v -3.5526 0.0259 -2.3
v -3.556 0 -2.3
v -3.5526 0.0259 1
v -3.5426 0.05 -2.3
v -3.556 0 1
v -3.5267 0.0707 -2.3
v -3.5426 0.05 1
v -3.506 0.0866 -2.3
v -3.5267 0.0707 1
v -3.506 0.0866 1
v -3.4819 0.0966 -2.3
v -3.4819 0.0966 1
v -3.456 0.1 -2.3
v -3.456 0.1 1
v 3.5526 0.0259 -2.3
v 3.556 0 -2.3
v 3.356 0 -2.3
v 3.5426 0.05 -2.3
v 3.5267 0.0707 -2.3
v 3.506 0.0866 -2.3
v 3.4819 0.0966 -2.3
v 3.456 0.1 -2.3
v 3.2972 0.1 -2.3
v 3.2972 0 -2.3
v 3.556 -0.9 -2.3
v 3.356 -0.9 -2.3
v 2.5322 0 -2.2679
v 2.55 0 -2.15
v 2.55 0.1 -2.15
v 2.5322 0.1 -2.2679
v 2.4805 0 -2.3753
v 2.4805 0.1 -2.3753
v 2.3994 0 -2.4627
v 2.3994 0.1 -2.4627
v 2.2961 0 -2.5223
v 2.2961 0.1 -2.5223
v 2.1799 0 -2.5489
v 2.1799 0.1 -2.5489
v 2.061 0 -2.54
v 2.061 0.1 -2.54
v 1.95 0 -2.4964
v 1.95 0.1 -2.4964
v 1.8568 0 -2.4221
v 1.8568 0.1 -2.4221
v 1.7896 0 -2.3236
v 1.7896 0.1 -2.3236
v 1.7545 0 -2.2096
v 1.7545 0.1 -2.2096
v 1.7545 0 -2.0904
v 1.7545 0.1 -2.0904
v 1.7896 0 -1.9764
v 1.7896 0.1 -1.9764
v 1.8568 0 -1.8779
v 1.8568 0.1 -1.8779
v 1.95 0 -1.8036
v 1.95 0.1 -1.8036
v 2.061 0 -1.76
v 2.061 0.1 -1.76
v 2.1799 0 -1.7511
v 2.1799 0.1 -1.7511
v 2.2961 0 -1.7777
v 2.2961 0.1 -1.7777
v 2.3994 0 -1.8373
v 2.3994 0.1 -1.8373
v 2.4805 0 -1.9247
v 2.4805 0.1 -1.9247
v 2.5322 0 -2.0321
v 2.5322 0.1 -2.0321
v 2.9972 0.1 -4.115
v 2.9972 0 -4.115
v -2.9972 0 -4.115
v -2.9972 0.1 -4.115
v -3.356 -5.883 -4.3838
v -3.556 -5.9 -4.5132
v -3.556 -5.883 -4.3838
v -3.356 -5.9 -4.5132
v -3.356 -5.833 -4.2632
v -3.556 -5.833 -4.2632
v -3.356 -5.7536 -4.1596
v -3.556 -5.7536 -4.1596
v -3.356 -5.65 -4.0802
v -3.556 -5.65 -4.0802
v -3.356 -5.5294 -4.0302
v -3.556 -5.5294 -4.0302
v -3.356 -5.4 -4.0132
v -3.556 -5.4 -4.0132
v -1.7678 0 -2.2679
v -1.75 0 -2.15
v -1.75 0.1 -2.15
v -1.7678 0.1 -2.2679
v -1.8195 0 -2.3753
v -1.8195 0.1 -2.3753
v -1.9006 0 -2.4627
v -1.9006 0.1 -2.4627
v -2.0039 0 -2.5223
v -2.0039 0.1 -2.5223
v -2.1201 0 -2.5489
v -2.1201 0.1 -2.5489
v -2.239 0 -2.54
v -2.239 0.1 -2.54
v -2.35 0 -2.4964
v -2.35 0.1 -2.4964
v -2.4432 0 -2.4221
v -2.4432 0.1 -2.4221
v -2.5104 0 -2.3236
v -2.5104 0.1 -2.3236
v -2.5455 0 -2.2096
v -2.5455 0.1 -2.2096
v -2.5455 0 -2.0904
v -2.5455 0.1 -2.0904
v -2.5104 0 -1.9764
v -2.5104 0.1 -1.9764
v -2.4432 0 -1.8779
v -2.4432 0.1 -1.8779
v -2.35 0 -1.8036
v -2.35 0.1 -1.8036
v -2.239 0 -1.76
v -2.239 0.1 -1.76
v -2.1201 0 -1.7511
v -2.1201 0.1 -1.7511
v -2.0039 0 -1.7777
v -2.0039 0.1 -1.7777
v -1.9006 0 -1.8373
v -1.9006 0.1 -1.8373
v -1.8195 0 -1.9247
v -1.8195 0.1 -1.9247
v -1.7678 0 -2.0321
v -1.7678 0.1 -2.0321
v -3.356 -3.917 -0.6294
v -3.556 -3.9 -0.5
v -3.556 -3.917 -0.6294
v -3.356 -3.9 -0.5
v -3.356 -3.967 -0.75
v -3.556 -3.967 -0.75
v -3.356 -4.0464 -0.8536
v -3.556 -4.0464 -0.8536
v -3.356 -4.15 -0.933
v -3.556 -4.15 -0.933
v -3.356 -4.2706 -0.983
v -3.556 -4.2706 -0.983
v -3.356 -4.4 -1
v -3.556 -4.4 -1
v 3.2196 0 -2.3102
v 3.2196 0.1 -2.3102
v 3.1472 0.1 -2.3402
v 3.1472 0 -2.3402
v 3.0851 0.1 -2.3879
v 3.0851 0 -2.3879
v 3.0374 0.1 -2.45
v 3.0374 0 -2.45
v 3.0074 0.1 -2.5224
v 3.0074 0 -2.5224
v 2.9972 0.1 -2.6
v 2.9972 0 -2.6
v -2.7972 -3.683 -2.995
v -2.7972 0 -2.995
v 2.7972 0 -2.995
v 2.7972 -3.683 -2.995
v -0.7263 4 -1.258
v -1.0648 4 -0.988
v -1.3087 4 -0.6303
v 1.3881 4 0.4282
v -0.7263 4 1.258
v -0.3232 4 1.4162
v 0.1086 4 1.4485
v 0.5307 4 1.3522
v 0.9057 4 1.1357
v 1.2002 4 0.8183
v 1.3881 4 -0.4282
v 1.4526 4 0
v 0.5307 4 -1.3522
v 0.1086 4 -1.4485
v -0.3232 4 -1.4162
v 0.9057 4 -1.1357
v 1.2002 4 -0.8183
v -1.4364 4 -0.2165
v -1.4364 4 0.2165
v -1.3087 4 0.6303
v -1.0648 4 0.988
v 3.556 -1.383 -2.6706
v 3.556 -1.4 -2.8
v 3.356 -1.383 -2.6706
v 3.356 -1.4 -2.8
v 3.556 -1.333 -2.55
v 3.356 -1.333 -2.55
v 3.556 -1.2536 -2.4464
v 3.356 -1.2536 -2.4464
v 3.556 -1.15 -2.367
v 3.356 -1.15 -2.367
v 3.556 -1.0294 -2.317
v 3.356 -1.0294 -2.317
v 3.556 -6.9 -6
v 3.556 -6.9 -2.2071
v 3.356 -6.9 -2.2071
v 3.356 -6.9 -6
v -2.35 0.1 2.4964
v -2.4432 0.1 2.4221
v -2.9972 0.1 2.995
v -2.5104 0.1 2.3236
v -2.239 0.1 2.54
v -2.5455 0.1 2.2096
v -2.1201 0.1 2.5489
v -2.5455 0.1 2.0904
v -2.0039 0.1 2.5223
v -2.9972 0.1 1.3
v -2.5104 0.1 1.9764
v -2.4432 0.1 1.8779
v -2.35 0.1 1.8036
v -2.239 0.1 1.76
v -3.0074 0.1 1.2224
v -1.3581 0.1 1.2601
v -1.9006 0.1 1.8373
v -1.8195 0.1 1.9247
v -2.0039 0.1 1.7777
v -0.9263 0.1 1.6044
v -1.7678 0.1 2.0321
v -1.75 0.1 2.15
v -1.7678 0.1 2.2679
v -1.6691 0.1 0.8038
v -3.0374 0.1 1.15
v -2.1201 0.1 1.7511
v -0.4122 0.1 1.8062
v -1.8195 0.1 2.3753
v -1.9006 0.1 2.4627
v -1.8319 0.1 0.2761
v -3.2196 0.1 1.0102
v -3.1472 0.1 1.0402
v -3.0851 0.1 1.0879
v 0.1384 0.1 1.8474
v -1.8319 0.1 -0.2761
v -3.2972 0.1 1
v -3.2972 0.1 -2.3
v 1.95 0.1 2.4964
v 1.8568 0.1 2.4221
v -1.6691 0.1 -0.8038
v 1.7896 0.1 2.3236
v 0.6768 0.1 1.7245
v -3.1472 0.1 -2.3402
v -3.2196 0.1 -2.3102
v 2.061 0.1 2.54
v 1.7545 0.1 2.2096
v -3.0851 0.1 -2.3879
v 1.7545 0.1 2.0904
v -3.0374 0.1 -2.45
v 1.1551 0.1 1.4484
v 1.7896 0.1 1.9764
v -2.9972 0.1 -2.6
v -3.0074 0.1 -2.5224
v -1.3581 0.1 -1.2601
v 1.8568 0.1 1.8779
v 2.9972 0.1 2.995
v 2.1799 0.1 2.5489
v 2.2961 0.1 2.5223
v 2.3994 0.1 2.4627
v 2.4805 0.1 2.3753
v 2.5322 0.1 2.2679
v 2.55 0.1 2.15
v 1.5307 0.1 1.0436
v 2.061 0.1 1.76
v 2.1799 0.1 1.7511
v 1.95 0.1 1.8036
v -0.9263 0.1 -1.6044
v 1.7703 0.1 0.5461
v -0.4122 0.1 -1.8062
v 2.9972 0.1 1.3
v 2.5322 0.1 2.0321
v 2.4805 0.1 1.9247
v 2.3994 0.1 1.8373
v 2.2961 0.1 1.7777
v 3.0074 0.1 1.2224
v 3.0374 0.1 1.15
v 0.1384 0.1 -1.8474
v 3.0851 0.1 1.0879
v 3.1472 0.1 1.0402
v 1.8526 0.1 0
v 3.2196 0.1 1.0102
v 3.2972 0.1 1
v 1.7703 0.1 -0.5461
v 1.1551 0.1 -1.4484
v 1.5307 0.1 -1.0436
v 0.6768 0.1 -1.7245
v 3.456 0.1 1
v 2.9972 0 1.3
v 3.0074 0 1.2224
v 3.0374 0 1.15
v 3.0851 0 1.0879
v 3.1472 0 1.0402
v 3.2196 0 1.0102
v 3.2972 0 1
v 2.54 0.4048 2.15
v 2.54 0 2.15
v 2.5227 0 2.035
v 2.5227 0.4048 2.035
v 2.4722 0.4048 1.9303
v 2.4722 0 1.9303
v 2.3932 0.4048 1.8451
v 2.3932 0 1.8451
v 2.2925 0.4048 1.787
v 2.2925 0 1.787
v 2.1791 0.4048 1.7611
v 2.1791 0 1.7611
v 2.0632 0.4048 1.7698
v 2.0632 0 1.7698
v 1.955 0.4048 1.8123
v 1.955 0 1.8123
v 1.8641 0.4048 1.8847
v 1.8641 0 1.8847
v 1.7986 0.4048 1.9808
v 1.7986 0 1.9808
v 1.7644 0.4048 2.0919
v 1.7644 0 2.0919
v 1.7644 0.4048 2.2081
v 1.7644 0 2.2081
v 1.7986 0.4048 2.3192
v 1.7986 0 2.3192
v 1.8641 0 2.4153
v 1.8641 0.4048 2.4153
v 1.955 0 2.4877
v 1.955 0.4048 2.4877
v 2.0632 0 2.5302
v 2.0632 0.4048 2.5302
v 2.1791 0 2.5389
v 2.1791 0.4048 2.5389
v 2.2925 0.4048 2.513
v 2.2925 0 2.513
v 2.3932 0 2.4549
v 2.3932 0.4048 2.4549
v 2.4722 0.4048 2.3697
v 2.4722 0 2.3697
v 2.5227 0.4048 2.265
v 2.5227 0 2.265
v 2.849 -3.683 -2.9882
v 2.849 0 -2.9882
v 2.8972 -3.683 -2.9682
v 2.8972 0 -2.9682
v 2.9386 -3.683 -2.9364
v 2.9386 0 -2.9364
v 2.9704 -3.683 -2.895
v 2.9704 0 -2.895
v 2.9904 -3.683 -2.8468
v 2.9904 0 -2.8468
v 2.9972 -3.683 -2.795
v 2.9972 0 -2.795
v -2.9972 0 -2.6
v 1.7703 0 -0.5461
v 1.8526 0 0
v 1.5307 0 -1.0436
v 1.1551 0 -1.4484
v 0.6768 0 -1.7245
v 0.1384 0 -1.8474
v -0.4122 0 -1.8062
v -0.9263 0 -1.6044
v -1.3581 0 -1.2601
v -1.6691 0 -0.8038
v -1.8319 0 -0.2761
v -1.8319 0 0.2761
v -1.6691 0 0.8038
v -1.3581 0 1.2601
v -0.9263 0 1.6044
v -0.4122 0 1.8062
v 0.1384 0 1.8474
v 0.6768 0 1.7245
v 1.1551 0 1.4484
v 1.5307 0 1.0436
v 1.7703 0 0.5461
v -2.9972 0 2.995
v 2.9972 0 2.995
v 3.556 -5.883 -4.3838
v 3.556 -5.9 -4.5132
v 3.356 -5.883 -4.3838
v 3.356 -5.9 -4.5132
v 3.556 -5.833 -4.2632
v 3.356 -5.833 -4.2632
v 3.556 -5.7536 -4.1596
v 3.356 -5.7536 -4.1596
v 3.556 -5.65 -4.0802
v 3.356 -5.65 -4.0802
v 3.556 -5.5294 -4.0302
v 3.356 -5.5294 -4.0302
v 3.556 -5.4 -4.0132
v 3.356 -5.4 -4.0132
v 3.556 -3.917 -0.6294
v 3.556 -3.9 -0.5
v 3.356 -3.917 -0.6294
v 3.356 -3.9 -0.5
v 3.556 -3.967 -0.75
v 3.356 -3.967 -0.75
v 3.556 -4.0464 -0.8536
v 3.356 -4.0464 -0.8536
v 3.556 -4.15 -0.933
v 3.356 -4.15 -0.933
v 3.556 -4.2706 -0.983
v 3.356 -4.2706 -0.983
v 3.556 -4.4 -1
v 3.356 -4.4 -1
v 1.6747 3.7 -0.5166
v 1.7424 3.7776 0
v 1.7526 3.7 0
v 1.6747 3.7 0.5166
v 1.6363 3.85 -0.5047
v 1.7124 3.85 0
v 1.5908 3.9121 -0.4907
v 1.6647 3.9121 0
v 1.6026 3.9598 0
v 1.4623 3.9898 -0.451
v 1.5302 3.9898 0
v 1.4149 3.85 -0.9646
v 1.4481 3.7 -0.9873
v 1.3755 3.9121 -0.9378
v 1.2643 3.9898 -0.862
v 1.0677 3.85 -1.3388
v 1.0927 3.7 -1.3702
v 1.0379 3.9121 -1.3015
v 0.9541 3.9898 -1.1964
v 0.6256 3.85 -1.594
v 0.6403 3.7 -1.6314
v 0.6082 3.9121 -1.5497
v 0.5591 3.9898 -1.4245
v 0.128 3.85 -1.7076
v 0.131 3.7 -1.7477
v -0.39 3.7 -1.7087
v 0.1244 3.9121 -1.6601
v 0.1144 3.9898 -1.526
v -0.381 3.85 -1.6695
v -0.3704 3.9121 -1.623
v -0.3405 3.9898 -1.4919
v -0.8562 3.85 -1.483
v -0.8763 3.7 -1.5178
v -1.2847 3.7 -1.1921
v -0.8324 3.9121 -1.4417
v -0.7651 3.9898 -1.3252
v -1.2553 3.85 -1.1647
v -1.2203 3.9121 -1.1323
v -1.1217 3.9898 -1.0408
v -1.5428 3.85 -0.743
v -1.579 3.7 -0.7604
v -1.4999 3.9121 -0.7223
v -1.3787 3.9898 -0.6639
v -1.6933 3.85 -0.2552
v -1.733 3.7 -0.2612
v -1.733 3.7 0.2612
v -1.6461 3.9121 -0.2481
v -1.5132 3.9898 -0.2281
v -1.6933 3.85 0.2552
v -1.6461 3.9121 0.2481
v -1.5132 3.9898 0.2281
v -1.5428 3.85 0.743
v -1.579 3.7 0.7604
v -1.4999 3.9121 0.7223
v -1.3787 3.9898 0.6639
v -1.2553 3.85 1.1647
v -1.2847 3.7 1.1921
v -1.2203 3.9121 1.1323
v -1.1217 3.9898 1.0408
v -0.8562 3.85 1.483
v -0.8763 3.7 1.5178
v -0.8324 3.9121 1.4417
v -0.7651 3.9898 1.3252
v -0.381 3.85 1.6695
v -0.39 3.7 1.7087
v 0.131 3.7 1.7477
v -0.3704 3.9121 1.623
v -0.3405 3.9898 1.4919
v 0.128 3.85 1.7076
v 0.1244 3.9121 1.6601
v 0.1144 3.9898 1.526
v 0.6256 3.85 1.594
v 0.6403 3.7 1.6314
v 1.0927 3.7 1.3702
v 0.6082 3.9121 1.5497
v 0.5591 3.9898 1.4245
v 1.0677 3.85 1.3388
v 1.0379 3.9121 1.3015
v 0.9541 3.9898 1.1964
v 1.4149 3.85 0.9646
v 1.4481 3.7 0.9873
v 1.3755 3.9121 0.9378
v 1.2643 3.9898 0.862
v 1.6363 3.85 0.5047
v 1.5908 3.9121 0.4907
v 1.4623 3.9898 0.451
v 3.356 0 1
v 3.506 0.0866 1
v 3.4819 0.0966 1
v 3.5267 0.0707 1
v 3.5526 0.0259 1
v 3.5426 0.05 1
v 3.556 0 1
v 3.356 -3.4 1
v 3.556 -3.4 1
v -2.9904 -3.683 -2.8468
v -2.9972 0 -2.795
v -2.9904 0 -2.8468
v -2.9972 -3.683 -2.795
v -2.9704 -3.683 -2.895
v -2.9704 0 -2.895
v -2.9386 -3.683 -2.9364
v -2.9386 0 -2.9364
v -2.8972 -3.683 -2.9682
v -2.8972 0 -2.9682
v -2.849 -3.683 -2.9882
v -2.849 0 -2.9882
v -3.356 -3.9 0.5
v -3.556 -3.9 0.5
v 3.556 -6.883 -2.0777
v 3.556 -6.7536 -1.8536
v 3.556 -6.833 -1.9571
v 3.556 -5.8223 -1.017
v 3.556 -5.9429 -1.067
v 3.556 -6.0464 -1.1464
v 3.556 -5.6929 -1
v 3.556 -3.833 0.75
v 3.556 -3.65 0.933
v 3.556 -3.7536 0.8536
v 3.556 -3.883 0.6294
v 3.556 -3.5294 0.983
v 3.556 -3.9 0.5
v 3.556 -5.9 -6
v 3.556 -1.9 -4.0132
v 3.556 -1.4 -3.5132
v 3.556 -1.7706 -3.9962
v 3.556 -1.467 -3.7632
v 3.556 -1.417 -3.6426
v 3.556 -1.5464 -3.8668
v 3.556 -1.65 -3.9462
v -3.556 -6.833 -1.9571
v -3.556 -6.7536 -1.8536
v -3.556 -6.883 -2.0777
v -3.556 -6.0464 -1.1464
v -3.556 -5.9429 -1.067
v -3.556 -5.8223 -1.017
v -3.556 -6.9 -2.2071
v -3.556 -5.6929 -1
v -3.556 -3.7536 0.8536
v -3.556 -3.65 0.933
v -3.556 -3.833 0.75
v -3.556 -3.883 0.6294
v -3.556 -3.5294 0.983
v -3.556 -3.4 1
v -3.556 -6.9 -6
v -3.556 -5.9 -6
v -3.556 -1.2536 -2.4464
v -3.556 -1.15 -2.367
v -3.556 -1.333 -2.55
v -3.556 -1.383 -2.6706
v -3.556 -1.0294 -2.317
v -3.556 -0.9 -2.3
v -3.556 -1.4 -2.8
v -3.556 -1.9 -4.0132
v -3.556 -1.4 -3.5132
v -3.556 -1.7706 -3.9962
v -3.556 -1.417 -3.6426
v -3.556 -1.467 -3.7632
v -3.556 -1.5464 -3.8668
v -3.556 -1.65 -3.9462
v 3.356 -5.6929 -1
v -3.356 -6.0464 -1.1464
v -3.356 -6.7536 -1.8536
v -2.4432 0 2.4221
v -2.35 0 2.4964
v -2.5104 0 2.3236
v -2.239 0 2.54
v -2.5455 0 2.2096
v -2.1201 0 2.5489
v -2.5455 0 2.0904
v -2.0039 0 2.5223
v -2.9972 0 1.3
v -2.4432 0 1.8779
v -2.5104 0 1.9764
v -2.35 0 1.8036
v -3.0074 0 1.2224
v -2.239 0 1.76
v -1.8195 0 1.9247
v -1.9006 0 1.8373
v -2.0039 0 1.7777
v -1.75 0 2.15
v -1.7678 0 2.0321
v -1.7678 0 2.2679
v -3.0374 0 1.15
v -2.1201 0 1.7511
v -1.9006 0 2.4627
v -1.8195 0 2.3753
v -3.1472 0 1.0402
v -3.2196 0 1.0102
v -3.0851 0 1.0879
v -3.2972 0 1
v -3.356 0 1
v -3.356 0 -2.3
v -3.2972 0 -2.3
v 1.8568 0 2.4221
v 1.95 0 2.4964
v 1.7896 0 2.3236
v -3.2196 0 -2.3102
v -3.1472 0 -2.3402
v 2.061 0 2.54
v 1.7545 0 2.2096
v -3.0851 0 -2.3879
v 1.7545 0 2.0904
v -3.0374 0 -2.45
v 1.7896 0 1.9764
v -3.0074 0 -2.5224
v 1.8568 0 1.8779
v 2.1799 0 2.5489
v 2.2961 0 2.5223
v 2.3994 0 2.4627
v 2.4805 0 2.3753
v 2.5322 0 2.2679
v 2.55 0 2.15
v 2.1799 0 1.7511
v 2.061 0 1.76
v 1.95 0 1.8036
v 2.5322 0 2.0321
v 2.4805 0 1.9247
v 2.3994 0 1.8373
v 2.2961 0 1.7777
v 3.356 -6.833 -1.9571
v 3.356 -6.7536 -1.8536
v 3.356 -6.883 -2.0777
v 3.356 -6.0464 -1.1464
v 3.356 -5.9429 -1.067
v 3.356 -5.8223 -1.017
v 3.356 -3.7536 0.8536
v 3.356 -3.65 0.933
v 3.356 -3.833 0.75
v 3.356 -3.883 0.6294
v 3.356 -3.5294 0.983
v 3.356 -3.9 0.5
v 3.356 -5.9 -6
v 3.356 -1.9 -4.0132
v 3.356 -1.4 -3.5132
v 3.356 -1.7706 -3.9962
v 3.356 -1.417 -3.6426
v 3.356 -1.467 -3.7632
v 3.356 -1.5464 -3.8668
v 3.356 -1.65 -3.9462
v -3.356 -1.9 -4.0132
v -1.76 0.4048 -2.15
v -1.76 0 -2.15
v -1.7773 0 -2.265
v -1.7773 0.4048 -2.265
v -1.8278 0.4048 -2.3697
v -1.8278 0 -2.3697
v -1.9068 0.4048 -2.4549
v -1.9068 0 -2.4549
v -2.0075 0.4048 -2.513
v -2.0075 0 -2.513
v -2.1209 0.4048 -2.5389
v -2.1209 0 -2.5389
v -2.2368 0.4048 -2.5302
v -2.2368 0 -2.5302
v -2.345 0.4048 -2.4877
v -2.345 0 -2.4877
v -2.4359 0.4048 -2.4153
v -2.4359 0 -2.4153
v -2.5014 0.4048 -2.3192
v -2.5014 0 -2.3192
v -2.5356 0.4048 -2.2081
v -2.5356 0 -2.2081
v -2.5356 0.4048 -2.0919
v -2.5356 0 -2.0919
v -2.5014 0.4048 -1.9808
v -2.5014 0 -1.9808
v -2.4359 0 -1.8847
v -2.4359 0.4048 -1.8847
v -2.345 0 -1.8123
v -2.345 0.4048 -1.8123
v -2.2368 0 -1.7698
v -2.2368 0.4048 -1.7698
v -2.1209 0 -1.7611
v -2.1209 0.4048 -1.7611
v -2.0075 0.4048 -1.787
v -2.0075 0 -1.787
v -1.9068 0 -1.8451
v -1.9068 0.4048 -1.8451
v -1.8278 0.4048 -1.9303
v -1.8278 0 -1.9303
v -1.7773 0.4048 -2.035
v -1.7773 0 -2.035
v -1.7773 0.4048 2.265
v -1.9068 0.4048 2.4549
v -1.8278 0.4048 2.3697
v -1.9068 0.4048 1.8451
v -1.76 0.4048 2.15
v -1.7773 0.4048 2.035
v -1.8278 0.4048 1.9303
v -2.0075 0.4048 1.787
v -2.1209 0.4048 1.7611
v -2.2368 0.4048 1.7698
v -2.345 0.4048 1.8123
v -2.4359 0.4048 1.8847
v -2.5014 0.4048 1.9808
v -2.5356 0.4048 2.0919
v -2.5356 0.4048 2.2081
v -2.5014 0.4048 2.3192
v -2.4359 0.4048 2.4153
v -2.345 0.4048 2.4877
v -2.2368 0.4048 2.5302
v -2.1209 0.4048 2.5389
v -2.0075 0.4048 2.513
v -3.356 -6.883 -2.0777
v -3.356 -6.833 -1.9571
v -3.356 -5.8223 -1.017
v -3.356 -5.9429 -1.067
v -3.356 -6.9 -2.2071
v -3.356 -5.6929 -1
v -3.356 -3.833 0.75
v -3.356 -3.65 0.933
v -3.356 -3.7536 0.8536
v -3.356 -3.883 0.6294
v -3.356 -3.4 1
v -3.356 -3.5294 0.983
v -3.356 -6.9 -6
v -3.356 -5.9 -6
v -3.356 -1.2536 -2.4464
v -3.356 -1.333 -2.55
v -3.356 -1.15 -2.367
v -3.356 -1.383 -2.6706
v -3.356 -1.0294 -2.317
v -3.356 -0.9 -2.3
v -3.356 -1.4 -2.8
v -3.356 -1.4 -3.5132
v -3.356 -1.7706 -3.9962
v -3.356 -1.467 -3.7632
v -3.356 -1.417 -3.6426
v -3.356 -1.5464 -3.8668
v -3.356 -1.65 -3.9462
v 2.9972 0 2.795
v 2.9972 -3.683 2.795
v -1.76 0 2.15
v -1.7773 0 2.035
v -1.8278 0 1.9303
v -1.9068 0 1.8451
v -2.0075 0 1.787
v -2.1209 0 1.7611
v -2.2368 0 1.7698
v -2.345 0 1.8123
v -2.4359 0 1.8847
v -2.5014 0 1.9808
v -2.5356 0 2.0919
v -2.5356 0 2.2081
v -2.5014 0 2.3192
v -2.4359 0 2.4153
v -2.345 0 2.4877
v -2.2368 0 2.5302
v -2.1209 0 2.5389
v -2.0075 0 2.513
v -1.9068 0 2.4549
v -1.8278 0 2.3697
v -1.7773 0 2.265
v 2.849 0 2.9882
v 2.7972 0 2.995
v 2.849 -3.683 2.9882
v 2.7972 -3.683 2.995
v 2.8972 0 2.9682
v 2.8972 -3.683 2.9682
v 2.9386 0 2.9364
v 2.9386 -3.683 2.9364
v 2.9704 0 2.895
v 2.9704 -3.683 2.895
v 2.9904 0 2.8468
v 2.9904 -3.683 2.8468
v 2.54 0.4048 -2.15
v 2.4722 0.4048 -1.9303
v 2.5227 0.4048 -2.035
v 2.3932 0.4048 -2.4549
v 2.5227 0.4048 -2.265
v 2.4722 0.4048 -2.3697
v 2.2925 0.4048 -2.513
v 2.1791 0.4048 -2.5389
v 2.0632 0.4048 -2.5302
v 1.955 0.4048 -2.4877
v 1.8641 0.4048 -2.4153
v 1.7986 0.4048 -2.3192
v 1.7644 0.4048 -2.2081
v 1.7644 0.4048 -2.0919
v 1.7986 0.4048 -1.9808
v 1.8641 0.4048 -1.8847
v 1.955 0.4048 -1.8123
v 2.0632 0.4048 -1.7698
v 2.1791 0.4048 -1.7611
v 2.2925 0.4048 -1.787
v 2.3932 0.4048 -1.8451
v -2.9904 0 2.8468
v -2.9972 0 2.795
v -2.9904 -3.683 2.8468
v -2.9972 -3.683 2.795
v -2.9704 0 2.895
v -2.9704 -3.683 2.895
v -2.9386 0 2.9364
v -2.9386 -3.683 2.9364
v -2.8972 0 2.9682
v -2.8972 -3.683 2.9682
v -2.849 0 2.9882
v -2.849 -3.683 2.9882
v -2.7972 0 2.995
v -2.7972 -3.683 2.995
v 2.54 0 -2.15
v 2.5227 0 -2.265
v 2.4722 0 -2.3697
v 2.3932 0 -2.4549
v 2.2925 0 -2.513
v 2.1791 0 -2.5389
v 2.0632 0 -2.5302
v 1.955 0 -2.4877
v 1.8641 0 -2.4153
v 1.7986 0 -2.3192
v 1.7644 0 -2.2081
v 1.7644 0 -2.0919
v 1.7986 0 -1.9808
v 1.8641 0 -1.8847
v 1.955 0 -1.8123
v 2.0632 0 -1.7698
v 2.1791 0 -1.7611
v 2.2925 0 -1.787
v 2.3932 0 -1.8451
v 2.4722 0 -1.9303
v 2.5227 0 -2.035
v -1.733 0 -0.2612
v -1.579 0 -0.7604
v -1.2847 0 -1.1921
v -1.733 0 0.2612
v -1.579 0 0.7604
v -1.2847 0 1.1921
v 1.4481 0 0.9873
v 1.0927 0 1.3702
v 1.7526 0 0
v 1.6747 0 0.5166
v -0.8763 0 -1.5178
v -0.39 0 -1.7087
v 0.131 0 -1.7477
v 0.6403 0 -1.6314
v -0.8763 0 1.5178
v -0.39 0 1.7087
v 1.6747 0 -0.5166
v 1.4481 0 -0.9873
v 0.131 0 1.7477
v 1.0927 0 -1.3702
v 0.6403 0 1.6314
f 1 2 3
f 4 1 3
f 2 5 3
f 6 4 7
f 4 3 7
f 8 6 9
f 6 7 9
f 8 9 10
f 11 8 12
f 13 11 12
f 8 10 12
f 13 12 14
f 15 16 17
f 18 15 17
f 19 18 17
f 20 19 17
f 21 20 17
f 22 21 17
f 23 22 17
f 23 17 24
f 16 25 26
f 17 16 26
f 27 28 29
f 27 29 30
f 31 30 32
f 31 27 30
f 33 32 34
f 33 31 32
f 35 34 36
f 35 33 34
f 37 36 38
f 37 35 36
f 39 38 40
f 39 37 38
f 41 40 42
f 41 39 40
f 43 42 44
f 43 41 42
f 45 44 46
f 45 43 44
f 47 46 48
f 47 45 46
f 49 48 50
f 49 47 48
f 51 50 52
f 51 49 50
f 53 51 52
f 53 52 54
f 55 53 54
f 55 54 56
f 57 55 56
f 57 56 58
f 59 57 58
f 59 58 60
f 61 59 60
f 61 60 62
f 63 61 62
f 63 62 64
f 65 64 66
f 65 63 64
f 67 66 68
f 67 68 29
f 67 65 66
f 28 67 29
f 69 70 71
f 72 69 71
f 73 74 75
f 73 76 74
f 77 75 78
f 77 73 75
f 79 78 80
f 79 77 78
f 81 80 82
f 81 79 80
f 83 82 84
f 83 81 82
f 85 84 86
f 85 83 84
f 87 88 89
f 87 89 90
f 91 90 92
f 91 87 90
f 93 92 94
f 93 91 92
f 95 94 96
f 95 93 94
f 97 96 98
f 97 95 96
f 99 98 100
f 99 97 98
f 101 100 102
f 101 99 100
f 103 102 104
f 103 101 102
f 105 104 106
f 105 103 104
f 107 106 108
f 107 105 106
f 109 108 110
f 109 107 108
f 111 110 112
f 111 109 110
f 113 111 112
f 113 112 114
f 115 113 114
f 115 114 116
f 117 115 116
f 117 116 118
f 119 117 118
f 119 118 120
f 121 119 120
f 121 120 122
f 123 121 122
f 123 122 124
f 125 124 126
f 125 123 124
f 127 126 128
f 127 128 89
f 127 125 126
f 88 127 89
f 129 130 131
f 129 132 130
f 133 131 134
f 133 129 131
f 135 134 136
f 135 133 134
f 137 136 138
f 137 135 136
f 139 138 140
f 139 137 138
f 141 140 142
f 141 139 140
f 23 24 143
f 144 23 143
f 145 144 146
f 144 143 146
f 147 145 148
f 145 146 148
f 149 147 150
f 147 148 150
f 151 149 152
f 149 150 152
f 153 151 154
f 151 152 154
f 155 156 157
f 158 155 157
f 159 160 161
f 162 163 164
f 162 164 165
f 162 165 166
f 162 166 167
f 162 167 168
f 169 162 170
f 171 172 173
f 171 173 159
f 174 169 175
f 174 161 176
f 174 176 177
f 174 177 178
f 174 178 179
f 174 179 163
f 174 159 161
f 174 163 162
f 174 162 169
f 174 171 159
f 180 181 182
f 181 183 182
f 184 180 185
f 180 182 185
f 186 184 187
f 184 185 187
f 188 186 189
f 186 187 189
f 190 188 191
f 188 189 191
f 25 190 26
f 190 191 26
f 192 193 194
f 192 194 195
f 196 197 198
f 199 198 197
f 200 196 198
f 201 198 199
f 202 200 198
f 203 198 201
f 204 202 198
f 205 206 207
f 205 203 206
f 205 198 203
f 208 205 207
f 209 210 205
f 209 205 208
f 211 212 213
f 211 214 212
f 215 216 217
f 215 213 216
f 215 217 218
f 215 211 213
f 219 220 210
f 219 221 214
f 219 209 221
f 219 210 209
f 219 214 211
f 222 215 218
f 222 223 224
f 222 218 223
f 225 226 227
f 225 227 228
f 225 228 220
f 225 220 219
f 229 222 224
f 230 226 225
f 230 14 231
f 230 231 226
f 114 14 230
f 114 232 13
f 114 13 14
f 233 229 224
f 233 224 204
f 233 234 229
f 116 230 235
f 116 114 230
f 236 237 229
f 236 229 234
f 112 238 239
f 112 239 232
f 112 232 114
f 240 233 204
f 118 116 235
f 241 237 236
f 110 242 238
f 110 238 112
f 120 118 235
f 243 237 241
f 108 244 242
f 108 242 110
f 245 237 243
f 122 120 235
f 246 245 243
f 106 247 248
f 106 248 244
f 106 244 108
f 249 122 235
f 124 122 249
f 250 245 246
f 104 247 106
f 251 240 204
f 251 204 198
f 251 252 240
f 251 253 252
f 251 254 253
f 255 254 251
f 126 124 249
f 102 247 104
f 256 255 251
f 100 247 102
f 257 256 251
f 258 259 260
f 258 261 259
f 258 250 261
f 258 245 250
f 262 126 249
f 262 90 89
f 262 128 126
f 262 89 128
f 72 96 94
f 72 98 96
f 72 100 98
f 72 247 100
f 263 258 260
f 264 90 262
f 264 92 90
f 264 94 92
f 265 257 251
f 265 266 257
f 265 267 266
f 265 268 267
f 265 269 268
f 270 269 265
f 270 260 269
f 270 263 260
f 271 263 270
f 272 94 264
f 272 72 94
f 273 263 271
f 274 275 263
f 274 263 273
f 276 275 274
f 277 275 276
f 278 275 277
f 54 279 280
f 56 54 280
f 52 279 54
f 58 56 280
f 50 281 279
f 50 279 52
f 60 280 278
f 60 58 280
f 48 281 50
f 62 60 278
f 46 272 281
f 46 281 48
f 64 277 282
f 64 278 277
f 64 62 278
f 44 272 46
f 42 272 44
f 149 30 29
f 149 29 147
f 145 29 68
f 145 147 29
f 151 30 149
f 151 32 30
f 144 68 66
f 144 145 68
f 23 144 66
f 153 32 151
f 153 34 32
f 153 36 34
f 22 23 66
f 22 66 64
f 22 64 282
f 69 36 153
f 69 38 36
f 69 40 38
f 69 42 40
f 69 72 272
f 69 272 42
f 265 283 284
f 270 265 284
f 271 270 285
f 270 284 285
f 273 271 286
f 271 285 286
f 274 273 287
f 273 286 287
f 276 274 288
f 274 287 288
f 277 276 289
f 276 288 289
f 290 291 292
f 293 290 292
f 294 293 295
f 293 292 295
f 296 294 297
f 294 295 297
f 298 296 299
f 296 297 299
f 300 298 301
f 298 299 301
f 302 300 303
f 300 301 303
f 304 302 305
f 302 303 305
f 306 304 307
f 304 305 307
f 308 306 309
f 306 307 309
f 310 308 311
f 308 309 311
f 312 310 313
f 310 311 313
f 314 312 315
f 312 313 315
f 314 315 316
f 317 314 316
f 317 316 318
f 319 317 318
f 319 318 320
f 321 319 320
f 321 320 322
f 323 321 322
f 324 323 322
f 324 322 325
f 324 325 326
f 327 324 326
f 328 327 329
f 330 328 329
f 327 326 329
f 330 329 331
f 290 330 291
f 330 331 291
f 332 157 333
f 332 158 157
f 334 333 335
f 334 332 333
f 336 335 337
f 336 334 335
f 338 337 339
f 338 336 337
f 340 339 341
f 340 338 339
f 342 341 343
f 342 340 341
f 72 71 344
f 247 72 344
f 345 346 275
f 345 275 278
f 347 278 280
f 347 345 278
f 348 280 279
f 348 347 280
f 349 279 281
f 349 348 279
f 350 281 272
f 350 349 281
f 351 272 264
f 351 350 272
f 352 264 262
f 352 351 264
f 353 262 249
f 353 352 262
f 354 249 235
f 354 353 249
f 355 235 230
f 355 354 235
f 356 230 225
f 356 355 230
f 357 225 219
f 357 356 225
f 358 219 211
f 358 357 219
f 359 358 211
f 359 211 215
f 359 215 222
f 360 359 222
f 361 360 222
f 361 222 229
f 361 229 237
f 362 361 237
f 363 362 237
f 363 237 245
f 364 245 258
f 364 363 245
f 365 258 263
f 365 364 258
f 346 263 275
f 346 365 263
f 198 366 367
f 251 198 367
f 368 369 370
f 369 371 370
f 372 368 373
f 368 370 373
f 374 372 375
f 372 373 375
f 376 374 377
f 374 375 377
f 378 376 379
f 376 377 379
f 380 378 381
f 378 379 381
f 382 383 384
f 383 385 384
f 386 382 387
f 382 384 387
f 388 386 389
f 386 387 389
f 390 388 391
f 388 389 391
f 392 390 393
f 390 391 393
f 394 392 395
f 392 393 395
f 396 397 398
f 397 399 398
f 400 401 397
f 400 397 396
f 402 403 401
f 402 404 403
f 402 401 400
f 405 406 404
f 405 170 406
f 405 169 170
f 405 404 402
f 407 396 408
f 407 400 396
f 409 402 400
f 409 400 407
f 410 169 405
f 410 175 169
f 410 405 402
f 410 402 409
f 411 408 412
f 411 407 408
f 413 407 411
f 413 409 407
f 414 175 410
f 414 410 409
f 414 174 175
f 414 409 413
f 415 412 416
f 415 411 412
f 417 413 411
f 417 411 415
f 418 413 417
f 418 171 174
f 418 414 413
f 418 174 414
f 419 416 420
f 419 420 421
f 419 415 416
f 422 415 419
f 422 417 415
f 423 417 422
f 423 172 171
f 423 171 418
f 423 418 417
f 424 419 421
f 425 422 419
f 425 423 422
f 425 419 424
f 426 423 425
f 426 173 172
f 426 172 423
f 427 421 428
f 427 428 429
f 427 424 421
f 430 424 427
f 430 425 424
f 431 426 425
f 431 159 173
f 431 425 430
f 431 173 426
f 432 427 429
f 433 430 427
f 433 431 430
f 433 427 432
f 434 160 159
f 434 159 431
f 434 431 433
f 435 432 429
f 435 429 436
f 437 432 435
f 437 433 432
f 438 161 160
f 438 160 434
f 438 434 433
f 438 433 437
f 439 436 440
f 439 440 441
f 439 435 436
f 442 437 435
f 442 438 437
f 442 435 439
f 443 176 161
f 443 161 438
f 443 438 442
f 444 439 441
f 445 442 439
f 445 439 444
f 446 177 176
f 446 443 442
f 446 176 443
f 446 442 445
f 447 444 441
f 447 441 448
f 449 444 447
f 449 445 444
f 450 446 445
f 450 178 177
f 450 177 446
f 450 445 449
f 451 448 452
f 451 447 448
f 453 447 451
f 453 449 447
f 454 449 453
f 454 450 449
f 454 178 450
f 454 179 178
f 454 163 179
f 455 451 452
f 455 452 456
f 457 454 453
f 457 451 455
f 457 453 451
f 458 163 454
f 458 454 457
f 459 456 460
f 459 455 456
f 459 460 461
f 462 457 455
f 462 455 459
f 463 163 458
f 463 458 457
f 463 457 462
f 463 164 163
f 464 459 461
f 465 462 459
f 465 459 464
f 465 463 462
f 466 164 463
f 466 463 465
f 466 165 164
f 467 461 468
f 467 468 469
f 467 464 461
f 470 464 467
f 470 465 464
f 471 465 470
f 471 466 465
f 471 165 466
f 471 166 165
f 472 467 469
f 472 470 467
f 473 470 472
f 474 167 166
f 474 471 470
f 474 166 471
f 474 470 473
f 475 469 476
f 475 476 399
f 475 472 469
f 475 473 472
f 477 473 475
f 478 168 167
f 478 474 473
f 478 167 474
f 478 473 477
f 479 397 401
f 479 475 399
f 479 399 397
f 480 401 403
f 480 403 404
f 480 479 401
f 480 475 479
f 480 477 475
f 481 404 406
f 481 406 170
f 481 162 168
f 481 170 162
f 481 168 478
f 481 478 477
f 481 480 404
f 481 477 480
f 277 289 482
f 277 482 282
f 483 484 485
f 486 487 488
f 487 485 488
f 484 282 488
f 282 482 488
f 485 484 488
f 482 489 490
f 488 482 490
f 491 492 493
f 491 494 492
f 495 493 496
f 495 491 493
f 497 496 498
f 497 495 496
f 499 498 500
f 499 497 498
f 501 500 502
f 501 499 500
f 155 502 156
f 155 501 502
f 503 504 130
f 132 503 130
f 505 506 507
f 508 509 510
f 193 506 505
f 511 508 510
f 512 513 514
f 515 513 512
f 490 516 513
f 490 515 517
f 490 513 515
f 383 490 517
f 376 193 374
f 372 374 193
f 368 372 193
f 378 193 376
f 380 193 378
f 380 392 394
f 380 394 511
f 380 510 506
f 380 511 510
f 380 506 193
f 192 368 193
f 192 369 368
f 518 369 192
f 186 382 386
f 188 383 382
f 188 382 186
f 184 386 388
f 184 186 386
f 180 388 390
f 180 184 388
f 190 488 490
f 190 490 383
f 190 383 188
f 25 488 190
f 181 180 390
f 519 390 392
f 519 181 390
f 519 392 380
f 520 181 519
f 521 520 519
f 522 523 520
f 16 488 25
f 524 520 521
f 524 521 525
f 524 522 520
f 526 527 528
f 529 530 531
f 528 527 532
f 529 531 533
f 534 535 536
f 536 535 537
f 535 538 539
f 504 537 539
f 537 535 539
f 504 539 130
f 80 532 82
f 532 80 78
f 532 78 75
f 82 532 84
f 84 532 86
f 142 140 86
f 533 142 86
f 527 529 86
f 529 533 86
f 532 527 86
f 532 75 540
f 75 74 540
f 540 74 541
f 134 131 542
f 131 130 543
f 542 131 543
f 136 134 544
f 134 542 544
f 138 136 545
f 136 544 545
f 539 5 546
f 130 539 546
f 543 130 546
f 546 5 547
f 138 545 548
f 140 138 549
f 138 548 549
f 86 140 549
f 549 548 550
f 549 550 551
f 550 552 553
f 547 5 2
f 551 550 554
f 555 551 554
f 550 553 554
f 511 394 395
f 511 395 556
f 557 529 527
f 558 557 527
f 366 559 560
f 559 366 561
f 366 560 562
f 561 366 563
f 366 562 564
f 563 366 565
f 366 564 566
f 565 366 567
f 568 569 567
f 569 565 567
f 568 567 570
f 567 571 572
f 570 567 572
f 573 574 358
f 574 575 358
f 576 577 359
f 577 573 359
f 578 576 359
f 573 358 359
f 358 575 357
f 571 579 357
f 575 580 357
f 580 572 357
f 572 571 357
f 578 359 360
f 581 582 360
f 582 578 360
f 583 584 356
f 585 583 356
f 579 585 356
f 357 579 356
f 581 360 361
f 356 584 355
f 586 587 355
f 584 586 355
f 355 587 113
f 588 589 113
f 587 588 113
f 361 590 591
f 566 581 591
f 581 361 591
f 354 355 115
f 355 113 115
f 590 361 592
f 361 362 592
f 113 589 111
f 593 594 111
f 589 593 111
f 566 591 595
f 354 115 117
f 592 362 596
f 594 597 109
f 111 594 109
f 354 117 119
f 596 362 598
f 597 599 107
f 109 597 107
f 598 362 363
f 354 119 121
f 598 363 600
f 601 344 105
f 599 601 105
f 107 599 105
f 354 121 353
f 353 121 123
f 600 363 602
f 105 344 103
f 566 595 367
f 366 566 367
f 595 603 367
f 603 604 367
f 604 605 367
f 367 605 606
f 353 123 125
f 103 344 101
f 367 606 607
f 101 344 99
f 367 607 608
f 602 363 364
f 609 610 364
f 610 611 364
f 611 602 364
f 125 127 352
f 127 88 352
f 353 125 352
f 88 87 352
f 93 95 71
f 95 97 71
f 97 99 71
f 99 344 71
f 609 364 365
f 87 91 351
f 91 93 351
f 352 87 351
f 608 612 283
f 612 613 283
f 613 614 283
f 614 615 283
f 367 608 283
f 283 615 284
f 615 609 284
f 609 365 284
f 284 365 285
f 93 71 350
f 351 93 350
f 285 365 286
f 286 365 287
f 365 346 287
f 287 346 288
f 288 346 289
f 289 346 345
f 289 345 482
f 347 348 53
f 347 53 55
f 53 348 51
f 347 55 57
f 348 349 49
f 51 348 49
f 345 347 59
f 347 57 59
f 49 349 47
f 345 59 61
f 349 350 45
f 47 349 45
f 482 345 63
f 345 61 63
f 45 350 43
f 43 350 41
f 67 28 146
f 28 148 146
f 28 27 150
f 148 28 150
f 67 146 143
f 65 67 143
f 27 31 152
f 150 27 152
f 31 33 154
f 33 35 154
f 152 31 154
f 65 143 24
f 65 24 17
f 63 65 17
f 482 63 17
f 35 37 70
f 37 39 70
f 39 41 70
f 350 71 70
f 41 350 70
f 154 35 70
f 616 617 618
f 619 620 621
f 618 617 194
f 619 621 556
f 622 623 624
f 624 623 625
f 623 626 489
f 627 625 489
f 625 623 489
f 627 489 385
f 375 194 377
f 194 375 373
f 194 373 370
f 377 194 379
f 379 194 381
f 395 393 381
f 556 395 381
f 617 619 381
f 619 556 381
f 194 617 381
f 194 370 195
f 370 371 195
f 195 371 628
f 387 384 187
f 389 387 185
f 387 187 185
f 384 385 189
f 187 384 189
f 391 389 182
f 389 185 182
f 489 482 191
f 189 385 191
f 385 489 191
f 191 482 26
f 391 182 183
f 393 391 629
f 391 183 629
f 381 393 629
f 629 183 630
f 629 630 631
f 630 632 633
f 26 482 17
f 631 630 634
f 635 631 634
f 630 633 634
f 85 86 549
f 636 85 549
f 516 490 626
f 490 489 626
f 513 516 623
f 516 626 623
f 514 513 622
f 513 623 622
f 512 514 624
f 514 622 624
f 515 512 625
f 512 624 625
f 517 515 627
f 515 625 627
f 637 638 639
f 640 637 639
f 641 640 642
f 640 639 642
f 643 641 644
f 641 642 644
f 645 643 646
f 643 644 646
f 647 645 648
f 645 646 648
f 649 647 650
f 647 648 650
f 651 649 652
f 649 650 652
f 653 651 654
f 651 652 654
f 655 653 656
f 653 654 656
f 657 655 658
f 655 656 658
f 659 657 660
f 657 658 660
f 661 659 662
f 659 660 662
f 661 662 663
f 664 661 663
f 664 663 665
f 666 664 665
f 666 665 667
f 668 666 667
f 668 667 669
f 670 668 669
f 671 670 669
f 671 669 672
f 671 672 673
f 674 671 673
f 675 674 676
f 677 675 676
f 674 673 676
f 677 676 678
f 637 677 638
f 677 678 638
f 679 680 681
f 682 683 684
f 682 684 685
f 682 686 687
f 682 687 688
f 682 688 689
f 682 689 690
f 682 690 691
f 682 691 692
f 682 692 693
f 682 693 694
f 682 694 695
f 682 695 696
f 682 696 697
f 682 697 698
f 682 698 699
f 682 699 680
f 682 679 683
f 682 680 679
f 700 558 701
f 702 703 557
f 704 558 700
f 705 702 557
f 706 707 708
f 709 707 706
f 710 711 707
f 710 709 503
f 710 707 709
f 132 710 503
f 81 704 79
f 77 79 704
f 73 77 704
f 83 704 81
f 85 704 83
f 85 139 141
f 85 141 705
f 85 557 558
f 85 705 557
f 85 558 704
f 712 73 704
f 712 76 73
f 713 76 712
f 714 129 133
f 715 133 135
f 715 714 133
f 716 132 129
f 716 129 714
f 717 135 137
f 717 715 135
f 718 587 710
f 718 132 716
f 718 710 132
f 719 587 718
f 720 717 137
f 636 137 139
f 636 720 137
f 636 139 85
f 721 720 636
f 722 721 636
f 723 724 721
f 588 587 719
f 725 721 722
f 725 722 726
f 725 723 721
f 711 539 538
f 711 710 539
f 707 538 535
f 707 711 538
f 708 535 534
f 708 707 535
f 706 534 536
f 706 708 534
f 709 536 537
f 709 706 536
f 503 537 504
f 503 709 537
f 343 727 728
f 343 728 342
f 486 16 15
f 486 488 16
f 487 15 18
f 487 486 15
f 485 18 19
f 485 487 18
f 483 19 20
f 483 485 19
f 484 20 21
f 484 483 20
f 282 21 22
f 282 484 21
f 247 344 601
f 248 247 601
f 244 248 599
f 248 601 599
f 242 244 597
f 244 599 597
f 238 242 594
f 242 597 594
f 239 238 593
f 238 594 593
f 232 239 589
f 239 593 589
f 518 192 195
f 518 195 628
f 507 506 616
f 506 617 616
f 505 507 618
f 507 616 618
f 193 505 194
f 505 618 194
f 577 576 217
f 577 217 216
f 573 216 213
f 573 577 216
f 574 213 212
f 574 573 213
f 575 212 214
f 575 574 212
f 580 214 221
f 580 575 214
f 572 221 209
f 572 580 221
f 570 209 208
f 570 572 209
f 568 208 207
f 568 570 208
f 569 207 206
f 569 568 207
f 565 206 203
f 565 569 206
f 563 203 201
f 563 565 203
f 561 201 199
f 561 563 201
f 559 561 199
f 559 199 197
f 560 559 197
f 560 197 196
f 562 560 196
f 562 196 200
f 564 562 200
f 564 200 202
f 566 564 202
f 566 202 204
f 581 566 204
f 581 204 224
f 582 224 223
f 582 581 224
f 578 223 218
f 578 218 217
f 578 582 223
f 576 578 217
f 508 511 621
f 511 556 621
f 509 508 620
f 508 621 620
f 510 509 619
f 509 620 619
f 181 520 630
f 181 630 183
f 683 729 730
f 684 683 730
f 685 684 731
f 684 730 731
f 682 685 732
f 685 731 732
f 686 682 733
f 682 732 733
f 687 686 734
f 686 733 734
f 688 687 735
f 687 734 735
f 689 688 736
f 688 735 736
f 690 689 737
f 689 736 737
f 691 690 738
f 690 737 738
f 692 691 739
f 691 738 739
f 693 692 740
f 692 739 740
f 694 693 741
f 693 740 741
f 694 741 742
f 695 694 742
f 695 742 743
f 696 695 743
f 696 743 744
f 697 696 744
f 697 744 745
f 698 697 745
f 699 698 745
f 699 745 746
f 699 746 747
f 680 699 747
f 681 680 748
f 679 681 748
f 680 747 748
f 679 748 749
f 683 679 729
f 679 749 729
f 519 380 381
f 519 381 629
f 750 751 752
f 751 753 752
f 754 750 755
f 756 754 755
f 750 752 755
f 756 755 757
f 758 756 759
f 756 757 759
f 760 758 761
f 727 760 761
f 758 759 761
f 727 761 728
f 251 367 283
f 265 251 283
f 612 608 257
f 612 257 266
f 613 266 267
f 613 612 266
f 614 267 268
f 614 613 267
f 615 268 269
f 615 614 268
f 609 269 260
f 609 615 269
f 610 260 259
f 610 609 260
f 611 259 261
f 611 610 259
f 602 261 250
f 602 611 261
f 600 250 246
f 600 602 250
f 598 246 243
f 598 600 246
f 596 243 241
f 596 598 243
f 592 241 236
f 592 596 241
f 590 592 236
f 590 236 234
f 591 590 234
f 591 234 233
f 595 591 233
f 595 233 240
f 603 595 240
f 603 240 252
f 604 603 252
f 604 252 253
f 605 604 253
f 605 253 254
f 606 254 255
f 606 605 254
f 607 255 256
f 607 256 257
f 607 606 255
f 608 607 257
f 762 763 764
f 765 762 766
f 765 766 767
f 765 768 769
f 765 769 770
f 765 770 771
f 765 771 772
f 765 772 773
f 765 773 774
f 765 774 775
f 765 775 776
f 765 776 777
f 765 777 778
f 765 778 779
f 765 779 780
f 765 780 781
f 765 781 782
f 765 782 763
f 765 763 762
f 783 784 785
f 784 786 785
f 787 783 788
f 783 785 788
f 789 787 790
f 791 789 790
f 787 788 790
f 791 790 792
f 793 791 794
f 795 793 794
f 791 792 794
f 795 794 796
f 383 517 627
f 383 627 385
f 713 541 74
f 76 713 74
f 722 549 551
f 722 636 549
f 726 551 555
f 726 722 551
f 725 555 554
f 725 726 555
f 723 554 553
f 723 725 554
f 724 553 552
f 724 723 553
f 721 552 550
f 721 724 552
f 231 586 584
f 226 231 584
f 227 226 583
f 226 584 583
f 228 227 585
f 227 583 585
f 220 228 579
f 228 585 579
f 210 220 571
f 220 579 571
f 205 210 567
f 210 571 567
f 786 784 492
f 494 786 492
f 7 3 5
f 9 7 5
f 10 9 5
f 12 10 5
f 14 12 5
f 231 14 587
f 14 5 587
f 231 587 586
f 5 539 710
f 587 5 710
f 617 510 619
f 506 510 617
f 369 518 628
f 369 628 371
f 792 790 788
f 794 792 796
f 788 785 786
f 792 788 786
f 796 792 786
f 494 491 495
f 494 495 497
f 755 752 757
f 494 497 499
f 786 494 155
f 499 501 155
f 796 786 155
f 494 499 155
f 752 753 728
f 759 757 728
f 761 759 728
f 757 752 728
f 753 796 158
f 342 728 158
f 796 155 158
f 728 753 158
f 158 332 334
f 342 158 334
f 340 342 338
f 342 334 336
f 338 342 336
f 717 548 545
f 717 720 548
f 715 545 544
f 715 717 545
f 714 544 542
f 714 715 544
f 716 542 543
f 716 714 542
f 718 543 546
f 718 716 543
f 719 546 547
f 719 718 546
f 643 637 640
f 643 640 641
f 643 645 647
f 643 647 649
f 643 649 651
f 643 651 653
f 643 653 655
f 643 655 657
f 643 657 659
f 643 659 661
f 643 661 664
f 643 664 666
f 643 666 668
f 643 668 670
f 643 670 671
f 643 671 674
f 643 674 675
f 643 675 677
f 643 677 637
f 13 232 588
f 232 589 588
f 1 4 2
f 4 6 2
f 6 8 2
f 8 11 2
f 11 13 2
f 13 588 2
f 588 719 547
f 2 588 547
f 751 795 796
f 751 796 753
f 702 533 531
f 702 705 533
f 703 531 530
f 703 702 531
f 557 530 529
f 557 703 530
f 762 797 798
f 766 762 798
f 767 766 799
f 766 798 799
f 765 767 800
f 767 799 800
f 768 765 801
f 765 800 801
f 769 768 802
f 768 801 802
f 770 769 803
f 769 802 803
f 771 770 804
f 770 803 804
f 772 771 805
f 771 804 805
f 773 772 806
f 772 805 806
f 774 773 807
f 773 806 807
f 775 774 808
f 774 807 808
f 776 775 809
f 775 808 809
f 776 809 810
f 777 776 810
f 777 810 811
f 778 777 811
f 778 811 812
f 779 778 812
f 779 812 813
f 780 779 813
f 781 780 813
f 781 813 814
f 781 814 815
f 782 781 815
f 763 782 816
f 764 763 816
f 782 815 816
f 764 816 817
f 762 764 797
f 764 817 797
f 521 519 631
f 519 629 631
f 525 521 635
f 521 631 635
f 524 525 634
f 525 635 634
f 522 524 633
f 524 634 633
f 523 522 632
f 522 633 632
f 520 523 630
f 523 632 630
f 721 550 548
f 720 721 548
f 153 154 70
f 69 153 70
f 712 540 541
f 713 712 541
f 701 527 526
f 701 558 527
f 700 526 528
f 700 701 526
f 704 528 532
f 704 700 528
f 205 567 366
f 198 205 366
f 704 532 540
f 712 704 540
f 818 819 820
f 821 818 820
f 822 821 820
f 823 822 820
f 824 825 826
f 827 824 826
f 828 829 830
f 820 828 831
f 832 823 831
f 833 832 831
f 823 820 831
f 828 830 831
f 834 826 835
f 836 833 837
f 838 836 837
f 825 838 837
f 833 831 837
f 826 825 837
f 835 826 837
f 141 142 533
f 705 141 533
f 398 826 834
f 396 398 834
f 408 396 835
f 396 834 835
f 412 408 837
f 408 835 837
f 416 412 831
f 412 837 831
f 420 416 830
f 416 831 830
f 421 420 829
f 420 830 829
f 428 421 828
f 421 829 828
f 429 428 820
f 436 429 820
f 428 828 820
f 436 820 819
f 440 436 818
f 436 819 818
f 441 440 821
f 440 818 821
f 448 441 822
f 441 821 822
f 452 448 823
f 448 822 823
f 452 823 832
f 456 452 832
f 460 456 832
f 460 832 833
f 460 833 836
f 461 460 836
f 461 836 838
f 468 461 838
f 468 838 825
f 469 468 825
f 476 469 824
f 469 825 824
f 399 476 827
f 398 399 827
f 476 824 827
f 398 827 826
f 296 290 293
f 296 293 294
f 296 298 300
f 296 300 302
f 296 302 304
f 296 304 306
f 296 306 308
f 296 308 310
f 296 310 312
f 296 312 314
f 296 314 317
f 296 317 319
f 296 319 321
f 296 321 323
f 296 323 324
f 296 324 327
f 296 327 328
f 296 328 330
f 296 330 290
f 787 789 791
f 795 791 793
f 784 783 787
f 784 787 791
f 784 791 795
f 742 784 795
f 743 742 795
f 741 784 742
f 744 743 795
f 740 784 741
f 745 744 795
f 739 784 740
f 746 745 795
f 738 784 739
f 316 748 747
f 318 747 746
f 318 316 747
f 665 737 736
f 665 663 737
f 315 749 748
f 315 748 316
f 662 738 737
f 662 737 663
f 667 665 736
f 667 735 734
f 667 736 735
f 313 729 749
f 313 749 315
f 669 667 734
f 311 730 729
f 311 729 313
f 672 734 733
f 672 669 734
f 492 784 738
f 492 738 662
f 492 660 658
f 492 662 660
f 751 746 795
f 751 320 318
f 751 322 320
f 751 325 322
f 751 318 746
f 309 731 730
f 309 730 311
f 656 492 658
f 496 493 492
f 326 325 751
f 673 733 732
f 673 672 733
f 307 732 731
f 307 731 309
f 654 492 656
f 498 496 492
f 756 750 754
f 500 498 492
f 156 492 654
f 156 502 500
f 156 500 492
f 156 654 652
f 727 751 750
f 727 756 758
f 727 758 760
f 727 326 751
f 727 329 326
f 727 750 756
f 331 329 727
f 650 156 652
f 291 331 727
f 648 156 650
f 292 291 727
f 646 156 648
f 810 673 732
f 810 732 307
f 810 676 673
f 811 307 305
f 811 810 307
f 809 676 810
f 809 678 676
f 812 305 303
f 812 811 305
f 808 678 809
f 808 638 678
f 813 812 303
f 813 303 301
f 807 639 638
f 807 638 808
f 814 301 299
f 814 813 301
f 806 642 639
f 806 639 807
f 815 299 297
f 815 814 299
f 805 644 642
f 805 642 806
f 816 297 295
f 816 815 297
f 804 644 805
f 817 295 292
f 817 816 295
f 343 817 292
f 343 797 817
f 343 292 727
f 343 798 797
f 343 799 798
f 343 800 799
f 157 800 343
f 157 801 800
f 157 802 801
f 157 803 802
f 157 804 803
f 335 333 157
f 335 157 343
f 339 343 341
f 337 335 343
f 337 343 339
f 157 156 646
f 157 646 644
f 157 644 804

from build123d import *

# Parameters (mm, degrees)
SKETCH1_W           = 5.9944
SKETCH1_H           = 5.99
EXTRUDE1_DEPTH      = 3.683
EXTRUDE2_DEPTH      = 0.2
FILLET3_R           = 0.5
SKETCH6_R           = 1.8526
SKETCH6_R_2         = 0.4
EXTRUDE3_DEPTH      = 0.1
SKETCH2_R           = 1.7526
EXTRUDE4_DEPTH      = 4
FILLET1_R           = 0.1
SKETCH8_R           = 0.39
BOSS_EXTRUDE1_DEPTH = 0.4048
FILLET4_R           = 0.2
FILLET5_R           = 0.3


with BuildPart() as part:
    # Sketch1 → Extrude1 (new body)
    with BuildSketch(Plane(origin=(0, 0, 0), x_dir=(1, 0, 0), z_dir=(0, 1, 0))):
        Rectangle(SKETCH1_W, SKETCH1_H)
    extrude(amount=-EXTRUDE1_DEPTH)

    # Sketch8 → Boss-Extrude1 (add)
    with BuildSketch(Plane(origin=(0, 0, 0), x_dir=(1, 0, 0), z_dir=(0, 1, 0))):
        with Locations((2.15, 2.15)):
            Circle(SKETCH8_R)
        with Locations((2.15, -2.15)):
            Circle(SKETCH8_R)
        with Locations((-2.15, 2.15)):
            Circle(SKETCH8_R)
        with Locations((-2.15, -2.15)):
            Circle(SKETCH8_R)
    extrude(amount=BOSS_EXTRUDE1_DEPTH)

    # Fillet4
    fillet4_edges = [part.edges().sort_by_distance(p)[0] for p in [
        (-2.9972, -1.8415, -2.995),
        (2.9972, -1.8415, -2.995),
        (2.9972, -1.8415, 2.995),
        (-2.9972, -1.8415, 2.995),
    ]]
    fillet(fillet4_edges, radius=FILLET4_R)


with BuildPart() as body_2:
    # Sketch5 → Extrude2 (new body)
    with BuildSketch(Plane(origin=(3.556, 0, 0), x_dir=(0, 0, -1), z_dir=(1, 0, 0))):
        Polygon((2.3, 0.1), (-1, 0.1), (-1, -3.9), (1, -3.9), (1, -5.9), (2, -6.9), (6, -6.9), (6, -5.9), (4.0132, -5.9), (4.0132, -1.4), (2.3, -1.4), align=None)
    extrude(amount=-EXTRUDE2_DEPTH)

    # Fillet3
    fillet3_edges = [body_2.edges().sort_by_distance(p)[0] for p in [
        (3.456, -3.9, 1),
        (3.456, -1.4, -2.3),
        (3.456, -1.4, -4.0132),
        (3.456, -5.9, -4.0132),
        (3.456, -6.9, -2),
        (3.456, -5.9, -1),
        (3.456, -3.9, -1),
    ]]
    fillet(fillet3_edges, radius=FILLET3_R)


with BuildPart() as body_3:
    # Mirror1: mirrored copy
    add(body_2.part.mirror(Plane(origin=(0, 0, 0), x_dir=(0, 0, 1), z_dir=(1, 0, 0))))


with BuildPart() as body_2_1:
    add(body_2.part)

    add(body_3.part)  # Extrude3 merges body 3
    # Sketch6 → Extrude3 (add, through all)
    with BuildSketch(Plane(origin=(0, 0, 0), x_dir=(1, 0, 0), z_dir=(0, 1, 0))):
        with BuildLine():
            Line((3.2972, -1), (3.556, -1))
            Line((3.556, -1), (3.556, 2.3))
            Line((3.556, 2.3), (3.2972, 2.3))
            ThreePointArc((3.2972, 2.3), (3.085067966, 2.387867966), (2.9972, 2.6))
            Line((2.9972, 2.6), (2.9972, 4.115))
            Line((2.9972, 4.115), (-2.9972, 4.115))
            Line((-2.9972, 4.115), (-2.9972, 2.6))
            ThreePointArc((-2.9972, 2.6), (-3.085067966, 2.387867966), (-3.2972, 2.3))
            Line((-3.2972, 2.3), (-3.556, 2.3))
            Line((-3.556, 2.3), (-3.556, -1))
            Line((-3.556, -1), (-3.2972, -1))
            ThreePointArc((-3.2972, -1), (-3.085067966, -1.087867966), (-2.9972, -1.3))
            Line((-2.9972, -1.3), (-2.9972, -2.995))
            Line((-2.9972, -2.995), (2.9972, -2.995))
            Line((2.9972, -2.995), (2.9972, -1.3))
            ThreePointArc((2.9972, -1.3), (3.085067966, -1.087867966), (3.2972, -1))
        make_face()
        Circle(SKETCH6_R, mode=Mode.SUBTRACT)
        with Locations((-2.15, 2.15)):
            Circle(SKETCH6_R_2, mode=Mode.SUBTRACT)
        with Locations((2.15, 2.15)):
            Circle(SKETCH6_R_2, mode=Mode.SUBTRACT)
        with Locations((2.15, -2.15)):
            Circle(SKETCH6_R_2, mode=Mode.SUBTRACT)
        with Locations((-2.15, -2.15)):
            Circle(SKETCH6_R_2, mode=Mode.SUBTRACT)
    extrude(amount=EXTRUDE3_DEPTH)

    # Fillet1
    fillet1_edges = [body_2_1.edges().sort_by_distance(p)[0] for p in [
        (3.556, 0.1, -0.65),
        (-3.556, 0.1, -0.65),
    ]]
    fillet(fillet1_edges, radius=FILLET1_R)


with BuildPart() as body_3_2:
    # Sketch2 → Extrude4 (new body)
    with BuildSketch(Plane(origin=(0, 0, 0), x_dir=(1, 0, 0), z_dir=(0, 1, 0))):
        Circle(SKETCH2_R)
    extrude(amount=EXTRUDE4_DEPTH)

    # Fillet5
    fillet5_edges = [body_3_2.edges().sort_by_distance(p)[0] for p in [
        (-1.7526, 4, 0),
    ]]
    fillet(fillet5_edges, radius=FILLET5_R)


solid = Compound([part.part, body_2_1.part, body_3_2.part])
